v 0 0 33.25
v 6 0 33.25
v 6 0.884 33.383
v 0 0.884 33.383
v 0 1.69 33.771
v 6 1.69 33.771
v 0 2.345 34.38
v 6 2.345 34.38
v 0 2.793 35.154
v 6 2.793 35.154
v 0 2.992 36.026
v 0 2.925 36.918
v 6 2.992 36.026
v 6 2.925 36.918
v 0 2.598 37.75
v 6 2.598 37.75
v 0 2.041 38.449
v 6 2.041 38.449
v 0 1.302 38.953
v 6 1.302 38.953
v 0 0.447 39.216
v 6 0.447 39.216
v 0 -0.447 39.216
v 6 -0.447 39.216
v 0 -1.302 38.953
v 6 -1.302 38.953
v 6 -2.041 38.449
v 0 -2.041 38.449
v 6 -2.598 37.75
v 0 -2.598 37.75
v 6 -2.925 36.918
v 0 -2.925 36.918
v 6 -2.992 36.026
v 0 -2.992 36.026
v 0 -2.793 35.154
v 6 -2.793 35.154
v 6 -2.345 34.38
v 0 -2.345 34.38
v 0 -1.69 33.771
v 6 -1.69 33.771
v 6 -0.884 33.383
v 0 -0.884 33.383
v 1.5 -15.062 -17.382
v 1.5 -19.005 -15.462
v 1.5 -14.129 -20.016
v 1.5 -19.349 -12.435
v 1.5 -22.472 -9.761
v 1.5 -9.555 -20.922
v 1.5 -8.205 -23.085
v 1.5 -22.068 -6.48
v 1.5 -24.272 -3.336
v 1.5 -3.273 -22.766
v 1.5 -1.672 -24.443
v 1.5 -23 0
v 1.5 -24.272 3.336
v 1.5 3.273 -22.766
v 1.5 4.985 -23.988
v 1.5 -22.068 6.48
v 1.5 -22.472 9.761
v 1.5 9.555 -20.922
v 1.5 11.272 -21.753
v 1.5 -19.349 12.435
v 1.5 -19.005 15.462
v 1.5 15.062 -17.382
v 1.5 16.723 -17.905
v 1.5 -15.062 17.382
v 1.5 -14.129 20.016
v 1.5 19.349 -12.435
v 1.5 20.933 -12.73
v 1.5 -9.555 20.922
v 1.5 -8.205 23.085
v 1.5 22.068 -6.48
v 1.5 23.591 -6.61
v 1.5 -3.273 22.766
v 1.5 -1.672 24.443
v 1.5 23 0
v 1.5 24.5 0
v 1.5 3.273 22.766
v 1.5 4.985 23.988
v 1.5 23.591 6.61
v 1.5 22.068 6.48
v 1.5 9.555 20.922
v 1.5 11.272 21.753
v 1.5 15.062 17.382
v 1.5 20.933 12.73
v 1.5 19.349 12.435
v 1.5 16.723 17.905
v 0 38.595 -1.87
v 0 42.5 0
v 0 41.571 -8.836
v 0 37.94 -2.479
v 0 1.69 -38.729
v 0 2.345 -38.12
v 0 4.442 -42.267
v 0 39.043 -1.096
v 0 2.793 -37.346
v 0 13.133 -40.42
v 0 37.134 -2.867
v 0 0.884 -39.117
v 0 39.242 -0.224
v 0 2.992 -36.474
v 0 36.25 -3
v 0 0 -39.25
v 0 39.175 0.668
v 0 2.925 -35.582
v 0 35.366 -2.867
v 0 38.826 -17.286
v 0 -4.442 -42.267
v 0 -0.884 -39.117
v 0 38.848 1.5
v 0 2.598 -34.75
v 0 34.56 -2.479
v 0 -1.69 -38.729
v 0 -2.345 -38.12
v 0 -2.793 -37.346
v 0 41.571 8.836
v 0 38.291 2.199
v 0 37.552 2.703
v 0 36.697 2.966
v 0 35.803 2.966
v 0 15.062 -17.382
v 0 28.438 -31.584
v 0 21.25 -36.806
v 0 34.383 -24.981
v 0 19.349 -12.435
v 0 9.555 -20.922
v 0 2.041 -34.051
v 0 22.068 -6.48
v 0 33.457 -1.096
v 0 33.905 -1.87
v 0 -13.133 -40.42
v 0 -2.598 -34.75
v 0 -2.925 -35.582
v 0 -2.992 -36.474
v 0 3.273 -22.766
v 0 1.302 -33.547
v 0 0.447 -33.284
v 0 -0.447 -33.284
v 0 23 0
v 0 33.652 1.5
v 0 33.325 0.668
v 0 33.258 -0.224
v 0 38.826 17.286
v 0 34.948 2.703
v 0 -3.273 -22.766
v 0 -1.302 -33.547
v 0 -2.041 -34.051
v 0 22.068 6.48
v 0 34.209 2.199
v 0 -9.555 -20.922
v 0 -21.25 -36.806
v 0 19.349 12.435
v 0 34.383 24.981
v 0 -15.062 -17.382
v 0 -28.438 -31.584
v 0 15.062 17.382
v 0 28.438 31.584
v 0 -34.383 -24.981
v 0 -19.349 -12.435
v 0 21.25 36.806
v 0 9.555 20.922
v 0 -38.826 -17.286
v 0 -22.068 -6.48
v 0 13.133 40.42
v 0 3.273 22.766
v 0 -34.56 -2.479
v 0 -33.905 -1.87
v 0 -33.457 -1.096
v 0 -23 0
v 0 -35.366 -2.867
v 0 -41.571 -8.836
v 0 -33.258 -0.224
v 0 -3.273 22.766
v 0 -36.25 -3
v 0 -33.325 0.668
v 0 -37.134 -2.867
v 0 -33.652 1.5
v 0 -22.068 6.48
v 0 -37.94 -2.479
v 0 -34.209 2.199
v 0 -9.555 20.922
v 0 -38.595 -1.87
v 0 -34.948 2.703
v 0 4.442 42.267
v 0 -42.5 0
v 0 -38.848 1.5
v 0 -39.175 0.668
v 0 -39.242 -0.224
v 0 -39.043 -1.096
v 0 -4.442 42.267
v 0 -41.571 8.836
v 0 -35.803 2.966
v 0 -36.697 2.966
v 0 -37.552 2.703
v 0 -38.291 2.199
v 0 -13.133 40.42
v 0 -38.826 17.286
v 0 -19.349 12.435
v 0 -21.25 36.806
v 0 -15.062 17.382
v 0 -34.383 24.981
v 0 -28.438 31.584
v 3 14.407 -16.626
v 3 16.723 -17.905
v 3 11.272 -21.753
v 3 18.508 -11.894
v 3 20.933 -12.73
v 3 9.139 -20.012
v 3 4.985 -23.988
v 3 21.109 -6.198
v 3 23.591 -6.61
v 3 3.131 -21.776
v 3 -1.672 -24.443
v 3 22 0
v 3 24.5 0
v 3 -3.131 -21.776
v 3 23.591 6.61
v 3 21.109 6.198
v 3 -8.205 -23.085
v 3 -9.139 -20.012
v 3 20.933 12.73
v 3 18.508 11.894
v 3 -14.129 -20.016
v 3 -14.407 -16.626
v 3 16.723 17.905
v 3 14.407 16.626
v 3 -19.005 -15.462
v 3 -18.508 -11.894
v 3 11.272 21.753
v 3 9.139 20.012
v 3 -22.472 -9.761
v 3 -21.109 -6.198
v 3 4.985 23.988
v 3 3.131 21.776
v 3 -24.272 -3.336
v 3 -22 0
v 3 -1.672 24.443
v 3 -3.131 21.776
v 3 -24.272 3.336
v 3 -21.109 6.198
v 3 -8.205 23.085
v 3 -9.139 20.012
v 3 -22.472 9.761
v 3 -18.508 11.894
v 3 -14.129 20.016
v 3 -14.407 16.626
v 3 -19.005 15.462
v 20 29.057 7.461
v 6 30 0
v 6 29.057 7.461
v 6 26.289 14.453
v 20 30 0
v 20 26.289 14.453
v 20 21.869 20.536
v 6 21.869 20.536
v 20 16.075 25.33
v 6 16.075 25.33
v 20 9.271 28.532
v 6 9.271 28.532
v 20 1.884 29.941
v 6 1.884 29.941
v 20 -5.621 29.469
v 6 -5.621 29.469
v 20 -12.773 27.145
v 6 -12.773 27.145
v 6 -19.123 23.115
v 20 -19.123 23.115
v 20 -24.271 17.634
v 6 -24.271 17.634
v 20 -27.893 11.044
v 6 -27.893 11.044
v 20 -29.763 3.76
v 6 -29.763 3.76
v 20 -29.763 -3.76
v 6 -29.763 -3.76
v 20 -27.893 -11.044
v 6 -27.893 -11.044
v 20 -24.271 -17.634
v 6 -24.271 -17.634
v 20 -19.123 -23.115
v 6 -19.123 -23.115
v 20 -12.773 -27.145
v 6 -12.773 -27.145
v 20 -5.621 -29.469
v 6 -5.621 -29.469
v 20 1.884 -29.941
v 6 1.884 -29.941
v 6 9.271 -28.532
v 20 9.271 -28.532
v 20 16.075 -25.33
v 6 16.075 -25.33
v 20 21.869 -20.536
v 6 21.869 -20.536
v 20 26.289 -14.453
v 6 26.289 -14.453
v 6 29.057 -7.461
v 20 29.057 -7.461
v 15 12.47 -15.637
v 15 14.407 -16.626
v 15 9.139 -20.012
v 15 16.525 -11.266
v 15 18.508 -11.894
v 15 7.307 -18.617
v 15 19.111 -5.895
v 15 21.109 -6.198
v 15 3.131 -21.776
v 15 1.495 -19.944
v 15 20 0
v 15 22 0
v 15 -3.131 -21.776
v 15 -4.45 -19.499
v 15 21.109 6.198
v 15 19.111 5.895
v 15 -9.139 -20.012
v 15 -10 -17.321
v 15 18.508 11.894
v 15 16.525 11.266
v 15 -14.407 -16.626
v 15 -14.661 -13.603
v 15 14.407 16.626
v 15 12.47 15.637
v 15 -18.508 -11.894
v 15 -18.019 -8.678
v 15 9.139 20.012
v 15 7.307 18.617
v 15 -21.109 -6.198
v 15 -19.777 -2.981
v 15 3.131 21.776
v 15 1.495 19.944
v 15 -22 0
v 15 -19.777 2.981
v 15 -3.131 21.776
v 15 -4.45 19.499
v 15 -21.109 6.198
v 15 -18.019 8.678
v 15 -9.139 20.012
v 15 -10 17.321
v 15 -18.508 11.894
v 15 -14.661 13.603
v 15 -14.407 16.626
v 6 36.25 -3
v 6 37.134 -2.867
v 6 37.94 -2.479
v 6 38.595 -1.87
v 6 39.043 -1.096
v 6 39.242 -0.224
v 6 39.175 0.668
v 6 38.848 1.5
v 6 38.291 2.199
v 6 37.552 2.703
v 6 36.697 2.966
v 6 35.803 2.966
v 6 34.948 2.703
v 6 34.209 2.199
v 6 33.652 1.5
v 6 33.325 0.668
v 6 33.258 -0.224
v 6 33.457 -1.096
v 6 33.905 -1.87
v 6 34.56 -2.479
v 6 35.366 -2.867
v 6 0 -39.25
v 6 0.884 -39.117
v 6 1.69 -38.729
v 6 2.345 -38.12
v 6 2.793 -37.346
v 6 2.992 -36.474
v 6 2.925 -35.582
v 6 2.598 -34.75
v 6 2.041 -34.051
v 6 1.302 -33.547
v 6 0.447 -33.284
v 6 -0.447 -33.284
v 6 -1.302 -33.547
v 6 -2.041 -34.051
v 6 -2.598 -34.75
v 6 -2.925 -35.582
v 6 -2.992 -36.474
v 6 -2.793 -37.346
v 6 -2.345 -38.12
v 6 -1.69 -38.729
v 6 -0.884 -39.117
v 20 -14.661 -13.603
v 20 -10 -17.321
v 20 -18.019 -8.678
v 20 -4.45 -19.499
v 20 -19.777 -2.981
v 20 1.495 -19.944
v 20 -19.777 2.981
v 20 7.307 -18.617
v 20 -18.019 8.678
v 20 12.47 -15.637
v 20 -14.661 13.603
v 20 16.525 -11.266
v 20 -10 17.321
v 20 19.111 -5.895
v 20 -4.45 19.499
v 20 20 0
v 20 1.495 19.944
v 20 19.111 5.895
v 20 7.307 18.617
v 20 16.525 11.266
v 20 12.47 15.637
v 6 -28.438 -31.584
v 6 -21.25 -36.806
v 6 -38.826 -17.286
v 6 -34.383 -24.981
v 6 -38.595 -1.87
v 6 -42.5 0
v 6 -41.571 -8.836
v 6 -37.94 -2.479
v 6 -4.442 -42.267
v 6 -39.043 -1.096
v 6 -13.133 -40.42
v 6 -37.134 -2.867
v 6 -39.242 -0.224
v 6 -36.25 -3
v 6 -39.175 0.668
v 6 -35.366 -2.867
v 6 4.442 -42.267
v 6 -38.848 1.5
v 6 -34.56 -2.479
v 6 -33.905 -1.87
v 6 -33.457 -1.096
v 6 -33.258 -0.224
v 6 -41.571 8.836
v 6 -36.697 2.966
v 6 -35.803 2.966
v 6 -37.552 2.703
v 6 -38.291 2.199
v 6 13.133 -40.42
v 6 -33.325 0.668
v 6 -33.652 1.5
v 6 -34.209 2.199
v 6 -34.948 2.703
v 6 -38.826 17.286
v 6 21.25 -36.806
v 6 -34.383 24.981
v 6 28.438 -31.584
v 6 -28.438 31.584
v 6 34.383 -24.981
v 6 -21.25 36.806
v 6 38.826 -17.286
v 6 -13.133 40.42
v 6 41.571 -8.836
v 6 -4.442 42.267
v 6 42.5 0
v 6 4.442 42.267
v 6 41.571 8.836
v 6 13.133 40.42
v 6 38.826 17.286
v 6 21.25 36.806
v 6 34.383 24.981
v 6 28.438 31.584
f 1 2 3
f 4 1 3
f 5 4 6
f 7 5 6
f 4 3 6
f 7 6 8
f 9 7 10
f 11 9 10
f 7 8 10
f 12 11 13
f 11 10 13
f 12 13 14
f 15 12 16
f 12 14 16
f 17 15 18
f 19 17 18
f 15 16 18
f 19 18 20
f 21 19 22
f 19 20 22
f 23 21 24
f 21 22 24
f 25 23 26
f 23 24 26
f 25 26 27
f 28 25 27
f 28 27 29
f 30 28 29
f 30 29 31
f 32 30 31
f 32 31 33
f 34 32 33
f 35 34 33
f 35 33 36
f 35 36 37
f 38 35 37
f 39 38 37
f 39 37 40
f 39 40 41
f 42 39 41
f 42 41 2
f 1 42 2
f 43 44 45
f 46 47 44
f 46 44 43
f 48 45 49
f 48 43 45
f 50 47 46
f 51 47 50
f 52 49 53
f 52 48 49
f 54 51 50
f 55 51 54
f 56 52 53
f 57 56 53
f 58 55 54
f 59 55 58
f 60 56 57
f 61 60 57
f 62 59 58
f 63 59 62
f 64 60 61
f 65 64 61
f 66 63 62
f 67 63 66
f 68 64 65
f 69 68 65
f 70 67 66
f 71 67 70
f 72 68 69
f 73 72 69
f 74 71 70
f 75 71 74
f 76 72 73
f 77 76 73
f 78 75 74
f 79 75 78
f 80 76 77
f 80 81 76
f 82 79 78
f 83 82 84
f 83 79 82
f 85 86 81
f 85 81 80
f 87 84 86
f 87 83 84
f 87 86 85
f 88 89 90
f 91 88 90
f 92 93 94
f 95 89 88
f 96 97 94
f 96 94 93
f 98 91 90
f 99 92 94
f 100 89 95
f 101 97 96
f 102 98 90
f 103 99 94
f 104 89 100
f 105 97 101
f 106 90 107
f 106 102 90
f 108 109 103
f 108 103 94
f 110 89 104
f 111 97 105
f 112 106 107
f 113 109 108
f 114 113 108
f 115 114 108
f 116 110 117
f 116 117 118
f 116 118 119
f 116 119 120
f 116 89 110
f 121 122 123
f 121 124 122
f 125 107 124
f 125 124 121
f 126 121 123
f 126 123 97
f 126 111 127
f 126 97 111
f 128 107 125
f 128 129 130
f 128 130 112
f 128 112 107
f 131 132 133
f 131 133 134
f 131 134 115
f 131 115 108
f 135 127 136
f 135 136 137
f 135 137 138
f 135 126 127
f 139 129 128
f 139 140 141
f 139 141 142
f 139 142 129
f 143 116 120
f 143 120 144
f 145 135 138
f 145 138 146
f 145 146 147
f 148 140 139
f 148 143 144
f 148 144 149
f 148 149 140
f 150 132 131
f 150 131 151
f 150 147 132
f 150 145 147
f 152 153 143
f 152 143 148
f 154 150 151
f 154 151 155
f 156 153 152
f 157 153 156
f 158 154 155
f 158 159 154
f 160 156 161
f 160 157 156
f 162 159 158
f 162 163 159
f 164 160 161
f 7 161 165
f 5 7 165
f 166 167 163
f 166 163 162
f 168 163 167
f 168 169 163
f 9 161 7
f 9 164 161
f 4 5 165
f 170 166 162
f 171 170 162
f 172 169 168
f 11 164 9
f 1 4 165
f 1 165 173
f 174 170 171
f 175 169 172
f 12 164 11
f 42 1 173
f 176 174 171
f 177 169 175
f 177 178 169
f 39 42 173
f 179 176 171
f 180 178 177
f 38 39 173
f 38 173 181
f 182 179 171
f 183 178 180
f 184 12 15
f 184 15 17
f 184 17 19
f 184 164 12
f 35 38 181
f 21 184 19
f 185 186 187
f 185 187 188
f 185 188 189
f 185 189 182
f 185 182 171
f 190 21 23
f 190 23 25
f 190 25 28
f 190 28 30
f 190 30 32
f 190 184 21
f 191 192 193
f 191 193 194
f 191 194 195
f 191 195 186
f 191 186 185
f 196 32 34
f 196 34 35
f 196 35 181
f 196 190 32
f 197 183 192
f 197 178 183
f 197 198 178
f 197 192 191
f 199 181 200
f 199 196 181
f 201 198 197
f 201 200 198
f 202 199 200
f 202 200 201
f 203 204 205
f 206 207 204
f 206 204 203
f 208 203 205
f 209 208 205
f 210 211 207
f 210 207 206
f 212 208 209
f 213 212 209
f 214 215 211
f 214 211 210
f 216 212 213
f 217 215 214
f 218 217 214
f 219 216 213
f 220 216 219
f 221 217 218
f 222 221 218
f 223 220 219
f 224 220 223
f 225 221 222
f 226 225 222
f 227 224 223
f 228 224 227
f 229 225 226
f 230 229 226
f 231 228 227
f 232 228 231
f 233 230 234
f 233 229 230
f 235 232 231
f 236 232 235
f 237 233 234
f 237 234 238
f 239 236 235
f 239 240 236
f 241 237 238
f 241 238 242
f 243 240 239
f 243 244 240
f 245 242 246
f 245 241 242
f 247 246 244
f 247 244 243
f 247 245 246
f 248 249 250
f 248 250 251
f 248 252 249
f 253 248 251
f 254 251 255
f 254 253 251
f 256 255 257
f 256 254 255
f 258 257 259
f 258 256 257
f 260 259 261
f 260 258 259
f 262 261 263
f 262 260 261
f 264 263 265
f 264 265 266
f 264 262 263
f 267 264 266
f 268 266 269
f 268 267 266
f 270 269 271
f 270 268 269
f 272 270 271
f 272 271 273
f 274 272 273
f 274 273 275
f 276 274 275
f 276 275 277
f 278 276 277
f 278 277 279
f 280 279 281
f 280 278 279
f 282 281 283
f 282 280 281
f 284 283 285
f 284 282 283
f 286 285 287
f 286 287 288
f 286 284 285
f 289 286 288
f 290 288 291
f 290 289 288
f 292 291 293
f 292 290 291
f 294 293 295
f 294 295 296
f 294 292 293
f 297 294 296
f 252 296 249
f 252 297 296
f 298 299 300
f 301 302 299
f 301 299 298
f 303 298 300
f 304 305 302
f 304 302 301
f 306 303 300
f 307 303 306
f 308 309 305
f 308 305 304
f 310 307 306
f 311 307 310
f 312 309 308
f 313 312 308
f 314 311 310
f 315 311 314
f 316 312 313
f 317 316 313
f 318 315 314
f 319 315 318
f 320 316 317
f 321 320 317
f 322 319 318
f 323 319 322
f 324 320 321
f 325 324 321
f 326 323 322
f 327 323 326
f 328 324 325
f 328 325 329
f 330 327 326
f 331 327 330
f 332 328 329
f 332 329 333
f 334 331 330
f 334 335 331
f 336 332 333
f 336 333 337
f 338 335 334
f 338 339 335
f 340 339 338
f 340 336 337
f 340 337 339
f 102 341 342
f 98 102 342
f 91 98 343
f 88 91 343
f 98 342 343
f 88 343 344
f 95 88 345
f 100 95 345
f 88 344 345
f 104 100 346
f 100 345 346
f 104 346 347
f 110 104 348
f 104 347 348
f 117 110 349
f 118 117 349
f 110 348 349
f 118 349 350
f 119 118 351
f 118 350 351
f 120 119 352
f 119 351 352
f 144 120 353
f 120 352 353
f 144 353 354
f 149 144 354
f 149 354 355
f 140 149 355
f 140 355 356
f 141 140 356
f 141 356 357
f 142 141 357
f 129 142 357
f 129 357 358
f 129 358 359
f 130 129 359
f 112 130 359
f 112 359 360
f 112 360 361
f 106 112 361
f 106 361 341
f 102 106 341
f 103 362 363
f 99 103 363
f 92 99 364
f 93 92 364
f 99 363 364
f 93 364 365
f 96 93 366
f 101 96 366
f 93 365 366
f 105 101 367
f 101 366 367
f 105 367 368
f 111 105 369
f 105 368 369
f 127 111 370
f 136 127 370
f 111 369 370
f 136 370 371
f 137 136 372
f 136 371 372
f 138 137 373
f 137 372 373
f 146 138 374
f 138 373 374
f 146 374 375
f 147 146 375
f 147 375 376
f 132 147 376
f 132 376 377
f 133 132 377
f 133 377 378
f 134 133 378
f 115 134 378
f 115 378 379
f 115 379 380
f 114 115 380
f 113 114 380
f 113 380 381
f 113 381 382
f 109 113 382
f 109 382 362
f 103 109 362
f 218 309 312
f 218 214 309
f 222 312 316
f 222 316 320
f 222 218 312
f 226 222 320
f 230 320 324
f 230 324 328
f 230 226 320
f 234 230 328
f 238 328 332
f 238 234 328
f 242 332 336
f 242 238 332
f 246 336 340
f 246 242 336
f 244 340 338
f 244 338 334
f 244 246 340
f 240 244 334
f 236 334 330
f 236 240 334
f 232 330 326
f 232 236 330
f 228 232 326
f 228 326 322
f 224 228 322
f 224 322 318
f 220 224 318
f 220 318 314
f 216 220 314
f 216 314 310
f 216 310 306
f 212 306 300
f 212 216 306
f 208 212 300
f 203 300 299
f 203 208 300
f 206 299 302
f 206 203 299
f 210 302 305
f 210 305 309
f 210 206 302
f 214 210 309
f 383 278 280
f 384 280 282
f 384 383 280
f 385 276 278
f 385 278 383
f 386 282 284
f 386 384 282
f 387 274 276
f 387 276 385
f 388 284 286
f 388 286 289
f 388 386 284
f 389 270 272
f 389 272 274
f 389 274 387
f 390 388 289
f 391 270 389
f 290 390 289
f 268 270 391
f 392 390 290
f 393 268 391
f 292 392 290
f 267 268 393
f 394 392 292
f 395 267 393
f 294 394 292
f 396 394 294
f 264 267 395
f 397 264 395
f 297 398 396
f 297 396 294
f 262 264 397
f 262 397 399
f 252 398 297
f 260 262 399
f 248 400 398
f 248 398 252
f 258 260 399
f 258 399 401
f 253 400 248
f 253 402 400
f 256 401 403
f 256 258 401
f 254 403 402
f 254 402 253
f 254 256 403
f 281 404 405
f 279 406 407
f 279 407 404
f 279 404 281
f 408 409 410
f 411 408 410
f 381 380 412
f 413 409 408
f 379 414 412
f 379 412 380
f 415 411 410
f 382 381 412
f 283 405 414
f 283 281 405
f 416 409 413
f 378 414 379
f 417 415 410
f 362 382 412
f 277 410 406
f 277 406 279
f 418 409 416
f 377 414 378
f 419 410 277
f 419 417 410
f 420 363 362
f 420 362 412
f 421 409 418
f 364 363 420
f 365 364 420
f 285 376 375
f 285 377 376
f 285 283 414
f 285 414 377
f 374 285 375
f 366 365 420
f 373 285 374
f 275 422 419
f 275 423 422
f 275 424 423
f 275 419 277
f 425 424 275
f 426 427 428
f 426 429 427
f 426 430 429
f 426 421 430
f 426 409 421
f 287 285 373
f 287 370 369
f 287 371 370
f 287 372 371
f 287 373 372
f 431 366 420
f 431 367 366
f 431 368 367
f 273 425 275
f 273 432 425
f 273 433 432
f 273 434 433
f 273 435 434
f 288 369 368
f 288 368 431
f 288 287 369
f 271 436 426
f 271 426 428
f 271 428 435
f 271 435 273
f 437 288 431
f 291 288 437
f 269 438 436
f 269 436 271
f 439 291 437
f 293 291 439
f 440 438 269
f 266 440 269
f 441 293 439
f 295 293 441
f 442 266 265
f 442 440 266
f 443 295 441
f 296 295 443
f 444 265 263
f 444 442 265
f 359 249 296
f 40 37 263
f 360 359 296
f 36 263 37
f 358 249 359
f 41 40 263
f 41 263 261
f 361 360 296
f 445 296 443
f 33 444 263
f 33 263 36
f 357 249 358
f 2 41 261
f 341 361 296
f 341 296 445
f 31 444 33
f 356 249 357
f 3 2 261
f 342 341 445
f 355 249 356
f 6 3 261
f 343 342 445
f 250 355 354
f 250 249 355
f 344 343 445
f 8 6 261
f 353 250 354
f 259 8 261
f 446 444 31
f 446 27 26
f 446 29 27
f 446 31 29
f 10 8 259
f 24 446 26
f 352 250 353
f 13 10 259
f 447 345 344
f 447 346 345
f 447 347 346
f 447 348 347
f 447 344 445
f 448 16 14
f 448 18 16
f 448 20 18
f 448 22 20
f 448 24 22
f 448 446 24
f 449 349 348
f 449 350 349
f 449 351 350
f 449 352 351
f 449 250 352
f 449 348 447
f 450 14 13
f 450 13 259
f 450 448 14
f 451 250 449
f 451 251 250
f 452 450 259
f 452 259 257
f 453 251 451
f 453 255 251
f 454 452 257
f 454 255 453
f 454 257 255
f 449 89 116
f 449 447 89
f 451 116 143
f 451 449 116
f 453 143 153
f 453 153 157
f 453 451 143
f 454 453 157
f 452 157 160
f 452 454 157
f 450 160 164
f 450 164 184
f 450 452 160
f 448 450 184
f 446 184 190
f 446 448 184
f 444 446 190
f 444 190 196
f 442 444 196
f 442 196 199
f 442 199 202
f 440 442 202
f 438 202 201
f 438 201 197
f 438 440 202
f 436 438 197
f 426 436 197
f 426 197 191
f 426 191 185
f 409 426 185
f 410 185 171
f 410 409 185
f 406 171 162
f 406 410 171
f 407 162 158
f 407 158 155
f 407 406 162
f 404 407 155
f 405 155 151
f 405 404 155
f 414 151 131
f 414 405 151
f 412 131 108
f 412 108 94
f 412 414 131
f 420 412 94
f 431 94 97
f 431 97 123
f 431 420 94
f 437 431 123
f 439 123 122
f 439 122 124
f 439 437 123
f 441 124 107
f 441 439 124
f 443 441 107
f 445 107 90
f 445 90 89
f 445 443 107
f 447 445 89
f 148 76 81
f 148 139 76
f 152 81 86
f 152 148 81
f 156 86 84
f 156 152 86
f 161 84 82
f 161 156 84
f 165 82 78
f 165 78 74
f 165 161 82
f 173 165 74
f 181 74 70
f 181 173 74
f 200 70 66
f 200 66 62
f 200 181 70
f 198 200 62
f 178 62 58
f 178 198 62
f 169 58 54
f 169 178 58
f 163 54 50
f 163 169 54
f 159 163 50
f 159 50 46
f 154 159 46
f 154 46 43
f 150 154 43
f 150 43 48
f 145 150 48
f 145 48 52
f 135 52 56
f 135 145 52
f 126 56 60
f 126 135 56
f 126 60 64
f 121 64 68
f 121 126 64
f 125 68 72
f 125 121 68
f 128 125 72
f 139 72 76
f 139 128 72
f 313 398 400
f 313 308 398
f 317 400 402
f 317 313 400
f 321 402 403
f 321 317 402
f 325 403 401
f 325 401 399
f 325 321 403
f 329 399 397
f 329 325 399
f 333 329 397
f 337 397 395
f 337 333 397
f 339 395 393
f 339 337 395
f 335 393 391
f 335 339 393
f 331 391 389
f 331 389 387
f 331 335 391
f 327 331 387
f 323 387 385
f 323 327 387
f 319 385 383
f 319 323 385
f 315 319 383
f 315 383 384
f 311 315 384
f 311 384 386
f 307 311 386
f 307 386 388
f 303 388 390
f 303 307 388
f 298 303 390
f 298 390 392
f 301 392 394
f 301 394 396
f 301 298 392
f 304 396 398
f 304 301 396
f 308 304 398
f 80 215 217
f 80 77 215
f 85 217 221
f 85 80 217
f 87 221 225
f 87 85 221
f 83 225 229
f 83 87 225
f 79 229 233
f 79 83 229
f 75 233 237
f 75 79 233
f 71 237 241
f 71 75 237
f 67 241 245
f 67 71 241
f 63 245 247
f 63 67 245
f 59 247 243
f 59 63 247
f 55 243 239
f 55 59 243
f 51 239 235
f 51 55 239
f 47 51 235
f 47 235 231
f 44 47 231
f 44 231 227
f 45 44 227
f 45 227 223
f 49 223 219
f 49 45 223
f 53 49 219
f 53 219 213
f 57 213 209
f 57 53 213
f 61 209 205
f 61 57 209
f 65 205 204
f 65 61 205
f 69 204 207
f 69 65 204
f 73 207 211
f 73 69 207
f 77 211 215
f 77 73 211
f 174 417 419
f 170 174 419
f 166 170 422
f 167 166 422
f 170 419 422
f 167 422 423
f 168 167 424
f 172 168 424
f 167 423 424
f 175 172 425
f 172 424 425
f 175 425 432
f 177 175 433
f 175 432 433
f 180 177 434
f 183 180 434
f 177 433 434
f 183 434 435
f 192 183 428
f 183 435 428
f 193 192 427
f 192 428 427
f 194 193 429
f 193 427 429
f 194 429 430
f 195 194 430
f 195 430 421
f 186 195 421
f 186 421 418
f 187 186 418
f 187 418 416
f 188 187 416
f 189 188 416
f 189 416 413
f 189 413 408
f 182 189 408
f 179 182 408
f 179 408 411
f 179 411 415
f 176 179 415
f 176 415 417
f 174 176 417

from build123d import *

# Parameters (mm, degrees)
ESBO_O2_R             = 3
CORTE_EXTRUS_O1_DEPTH = 7


with BuildPart() as part:
    # Esboço1 → Revolução1 (revolve)
    with BuildSketch(Plane.XY):
        Polygon((0, 23), (0, 42.5), (6, 42.5), (6, 30), (20, 30), (20, 20), (15, 20), (15, 22), (3, 22), (3, 24.5), (1.5, 24.5), (1.5, 23), align=None)
    revolve(axis=Axis((0, 0, 0), (1, 0, 0)))

    # Esboço2 → Corte-extrusão1 (cut, through all)
    with BuildSketch(Plane(origin=(6, 0, 0), x_dir=(0, 0, -1), z_dir=(1, 0, 0))):
        with Locations((0, 36.25)):
            Circle(ESBO_O2_R)
        with Locations((36.25, 0)):
            Circle(ESBO_O2_R)
        with Locations((0, -36.25)):
            Circle(ESBO_O2_R)
        with Locations((-36.25, 0)):
            Circle(ESBO_O2_R)
    extrude(amount=-CORTE_EXTRUS_O1_DEPTH, mode=Mode.SUBTRACT)


solid = part.part
